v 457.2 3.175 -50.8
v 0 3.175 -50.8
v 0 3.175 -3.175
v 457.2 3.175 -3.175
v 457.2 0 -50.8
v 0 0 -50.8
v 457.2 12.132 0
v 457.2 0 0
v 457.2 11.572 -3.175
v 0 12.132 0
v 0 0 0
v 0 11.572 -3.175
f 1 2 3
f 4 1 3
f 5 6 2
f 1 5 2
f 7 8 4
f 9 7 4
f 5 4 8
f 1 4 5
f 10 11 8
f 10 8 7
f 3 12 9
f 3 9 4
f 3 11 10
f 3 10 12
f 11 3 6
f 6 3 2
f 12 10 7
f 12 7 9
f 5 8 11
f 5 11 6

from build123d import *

# Parameters (mm, degrees)
SKETCH1_W           = 50.8
SKETCH1_H           = 12.13231
BOSS_EXTRUDE1_DEPTH = 457.2
CUT_EXTRUDE1_DEPTH  = 457.2


with BuildPart() as part:
    # Sketch1 → Boss-Extrude1 (new body)
    with BuildSketch(Plane(origin=(0, 0, 0), x_dir=(0, 0, -1), z_dir=(1, 0, 0))):
        with Locations((25.4, 6.066155)):
            Rectangle(SKETCH1_W, SKETCH1_H)
    extrude(amount=BOSS_EXTRUDE1_DEPTH)

    # Sketch2 → Cut-Extrude1 (cut)
    with BuildSketch(Plane.ZY):
        Polygon((-41.275, 12.13231), (-3.175, 12.13231), (0, 12.13231), (-3.175, 11.572471836), (-3.175, 3.175), (-41.275, 3.175), (-50.8, 3.175), (-50.8, 12.13231), align=None)
    extrude(amount=-CUT_EXTRUDE1_DEPTH, mode=Mode.SUBTRACT)


solid = part.part
